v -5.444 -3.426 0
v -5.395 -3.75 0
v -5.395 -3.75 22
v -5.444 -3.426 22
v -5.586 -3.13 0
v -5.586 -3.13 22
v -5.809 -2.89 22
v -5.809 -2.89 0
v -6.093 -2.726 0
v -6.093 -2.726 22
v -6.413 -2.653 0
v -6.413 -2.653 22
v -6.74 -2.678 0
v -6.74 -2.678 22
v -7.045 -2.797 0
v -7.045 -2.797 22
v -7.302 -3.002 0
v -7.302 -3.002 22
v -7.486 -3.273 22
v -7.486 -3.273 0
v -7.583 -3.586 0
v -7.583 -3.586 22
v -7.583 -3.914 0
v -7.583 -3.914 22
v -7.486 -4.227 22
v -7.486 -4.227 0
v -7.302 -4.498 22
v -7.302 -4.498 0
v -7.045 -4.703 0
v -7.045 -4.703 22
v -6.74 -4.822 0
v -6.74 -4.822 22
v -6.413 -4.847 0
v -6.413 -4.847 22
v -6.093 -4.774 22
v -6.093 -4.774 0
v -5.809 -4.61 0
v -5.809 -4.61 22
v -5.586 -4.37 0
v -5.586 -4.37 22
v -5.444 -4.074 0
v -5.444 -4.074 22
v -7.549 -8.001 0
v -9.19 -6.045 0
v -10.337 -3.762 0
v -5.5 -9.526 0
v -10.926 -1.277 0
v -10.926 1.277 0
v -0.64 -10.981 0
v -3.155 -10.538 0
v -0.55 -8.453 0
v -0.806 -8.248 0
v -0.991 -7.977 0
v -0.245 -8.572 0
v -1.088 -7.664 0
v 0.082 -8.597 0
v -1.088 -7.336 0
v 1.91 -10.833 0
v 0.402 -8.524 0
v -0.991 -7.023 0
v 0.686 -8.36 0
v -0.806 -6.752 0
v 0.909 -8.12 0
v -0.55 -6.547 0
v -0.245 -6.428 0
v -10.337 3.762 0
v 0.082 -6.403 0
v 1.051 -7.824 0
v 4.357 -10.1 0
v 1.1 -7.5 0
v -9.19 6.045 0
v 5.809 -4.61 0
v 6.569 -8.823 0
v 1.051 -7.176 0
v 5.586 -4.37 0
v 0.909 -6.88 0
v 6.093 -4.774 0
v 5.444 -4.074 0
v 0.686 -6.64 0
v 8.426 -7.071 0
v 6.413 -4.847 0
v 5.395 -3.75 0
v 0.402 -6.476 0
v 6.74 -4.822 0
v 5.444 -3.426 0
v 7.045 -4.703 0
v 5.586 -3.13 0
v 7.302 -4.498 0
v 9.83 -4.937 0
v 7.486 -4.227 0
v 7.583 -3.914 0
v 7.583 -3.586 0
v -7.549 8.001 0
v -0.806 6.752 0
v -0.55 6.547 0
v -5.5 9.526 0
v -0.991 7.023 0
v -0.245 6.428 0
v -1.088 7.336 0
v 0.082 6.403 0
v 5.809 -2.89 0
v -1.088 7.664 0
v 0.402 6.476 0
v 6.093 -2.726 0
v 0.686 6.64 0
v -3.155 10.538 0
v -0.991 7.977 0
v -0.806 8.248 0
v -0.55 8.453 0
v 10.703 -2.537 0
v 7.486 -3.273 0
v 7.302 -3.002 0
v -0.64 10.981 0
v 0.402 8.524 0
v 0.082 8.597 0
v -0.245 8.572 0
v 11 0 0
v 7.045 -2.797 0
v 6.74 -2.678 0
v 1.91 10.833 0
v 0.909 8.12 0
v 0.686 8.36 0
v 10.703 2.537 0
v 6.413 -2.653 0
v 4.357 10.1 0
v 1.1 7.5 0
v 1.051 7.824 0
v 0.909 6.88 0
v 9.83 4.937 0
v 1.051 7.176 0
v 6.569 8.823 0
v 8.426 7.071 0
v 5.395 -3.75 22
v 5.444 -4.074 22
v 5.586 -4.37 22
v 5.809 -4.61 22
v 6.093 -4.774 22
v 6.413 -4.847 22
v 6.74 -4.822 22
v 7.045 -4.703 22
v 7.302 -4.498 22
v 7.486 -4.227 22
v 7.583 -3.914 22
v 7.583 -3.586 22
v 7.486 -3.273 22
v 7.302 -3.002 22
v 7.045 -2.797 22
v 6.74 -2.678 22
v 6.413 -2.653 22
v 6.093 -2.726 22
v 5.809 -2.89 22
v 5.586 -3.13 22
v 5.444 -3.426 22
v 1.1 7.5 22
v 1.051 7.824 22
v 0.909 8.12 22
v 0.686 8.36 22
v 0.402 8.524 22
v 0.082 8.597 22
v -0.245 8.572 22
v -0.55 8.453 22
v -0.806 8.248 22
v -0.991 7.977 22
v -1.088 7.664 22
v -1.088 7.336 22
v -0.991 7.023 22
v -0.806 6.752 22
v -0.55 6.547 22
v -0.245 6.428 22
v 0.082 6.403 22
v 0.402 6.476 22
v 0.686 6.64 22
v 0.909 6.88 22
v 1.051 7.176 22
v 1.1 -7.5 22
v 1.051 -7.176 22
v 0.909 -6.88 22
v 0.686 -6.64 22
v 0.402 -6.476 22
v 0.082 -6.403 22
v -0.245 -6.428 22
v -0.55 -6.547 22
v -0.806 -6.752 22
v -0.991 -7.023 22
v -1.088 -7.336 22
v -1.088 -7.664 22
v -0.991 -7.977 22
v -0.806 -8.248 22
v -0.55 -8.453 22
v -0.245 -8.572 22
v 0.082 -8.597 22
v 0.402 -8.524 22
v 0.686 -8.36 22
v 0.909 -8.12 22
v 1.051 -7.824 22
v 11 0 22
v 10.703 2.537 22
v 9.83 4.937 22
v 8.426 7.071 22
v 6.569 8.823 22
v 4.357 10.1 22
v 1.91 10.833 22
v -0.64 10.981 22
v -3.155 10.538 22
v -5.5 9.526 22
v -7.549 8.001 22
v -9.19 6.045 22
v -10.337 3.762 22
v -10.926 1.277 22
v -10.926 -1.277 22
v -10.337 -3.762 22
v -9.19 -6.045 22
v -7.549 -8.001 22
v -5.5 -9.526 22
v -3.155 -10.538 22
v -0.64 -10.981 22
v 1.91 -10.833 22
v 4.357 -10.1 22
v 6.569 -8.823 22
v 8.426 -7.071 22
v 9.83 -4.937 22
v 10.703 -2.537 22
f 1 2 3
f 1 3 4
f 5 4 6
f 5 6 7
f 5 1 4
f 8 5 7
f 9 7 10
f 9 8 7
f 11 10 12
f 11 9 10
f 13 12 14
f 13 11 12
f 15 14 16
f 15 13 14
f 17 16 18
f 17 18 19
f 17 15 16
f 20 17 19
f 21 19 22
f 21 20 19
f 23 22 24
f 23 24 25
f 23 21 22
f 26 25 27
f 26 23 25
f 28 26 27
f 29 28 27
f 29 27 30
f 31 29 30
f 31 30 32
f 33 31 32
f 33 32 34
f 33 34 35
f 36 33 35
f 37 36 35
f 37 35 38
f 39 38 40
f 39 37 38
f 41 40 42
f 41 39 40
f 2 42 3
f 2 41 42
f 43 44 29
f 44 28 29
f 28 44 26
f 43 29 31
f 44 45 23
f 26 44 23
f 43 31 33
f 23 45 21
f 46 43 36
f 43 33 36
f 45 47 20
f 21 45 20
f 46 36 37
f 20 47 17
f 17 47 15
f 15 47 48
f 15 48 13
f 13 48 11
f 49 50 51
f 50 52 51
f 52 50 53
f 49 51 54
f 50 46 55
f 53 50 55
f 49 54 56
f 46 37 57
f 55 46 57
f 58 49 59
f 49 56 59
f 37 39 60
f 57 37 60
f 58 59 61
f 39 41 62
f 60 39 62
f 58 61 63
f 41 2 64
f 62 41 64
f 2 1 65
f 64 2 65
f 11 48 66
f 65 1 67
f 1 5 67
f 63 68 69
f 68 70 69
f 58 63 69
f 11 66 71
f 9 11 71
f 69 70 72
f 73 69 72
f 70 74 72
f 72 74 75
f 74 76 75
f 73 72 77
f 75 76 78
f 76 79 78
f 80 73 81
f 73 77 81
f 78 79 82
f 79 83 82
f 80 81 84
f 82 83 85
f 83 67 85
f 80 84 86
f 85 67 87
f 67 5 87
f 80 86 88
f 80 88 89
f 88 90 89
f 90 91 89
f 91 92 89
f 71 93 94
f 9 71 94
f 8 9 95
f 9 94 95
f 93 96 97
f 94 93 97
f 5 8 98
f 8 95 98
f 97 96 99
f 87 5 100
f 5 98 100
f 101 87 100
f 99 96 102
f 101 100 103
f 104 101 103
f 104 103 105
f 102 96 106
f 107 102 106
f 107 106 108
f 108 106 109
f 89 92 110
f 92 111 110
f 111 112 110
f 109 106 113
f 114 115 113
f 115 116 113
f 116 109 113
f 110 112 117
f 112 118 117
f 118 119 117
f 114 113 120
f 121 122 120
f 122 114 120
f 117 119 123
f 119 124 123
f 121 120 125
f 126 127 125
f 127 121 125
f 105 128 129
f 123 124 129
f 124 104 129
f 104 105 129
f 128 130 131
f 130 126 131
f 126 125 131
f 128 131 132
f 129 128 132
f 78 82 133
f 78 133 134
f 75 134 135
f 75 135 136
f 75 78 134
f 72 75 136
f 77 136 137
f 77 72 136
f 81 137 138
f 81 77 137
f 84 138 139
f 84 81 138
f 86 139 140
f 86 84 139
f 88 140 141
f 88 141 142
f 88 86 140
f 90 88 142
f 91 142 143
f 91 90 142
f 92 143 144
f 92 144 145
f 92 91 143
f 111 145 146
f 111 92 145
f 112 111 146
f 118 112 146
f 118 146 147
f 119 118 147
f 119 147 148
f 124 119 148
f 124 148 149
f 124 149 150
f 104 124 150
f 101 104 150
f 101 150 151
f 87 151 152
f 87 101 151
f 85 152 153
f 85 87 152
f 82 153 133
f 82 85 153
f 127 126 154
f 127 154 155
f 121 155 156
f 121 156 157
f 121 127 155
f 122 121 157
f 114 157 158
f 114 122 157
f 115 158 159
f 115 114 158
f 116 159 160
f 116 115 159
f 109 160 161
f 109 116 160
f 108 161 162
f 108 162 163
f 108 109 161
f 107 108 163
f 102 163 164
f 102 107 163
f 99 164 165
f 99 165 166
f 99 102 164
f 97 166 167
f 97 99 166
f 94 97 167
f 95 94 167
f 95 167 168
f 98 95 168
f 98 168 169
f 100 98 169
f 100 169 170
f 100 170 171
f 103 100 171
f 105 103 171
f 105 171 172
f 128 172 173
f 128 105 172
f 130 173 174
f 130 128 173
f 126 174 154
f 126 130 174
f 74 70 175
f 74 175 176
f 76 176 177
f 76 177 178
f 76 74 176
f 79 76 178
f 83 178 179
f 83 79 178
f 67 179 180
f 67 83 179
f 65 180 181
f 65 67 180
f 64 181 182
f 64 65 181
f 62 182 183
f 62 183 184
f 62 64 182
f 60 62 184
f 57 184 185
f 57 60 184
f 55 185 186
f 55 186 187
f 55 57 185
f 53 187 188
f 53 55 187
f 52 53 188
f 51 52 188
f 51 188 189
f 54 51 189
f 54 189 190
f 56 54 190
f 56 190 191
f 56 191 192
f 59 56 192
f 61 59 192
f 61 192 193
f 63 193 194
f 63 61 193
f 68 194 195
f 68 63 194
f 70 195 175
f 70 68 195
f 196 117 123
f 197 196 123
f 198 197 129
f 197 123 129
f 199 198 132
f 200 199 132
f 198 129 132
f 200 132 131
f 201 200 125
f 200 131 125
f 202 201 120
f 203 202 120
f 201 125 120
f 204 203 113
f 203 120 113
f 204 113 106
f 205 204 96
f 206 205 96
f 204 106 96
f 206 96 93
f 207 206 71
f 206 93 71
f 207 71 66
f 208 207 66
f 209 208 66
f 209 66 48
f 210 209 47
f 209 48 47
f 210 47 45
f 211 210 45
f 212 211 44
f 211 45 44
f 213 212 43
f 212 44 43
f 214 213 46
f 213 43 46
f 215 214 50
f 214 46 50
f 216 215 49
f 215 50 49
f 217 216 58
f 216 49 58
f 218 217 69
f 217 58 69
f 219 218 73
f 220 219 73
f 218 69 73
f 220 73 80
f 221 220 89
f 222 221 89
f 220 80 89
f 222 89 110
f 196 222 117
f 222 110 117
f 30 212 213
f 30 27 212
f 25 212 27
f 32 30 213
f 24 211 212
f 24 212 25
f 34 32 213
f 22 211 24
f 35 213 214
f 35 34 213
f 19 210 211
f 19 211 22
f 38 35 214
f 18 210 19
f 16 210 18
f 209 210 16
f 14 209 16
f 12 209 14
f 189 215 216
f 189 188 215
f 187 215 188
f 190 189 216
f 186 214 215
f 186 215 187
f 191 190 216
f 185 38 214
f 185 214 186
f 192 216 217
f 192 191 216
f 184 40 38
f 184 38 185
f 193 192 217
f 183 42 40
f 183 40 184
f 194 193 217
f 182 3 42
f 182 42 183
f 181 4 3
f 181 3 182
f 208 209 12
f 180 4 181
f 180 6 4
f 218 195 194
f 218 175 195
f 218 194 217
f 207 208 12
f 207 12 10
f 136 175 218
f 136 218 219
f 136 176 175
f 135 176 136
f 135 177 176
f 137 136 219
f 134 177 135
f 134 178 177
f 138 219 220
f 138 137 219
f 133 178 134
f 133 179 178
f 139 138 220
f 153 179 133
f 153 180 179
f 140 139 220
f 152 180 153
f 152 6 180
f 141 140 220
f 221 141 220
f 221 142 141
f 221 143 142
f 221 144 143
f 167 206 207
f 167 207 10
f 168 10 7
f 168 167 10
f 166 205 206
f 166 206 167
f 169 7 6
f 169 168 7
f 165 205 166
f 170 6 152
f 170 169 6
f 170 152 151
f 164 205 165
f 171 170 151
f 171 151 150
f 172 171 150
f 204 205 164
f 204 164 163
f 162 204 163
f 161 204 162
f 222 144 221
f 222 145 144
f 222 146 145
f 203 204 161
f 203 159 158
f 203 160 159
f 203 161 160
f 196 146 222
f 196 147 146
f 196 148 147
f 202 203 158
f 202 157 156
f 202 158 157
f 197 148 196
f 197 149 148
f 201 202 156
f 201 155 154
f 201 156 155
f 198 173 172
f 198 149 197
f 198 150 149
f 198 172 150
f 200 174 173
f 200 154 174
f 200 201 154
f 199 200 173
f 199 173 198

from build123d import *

# Parameters (mm, degrees)
SKETCH_1_R      = 11
SKETCH_1_R_2    = 1.1
EXTRUDE_1_DEPTH = 22


with BuildPart() as part:
    # 草图1 → 凸台-拉伸1 (new body)
    with BuildSketch(Plane.XY):
        Circle(SKETCH_1_R)
        with Locations((0, 7.5)):
            Circle(SKETCH_1_R_2, mode=Mode.SUBTRACT)
        with Locations((0, -7.5)):
            Circle(SKETCH_1_R_2, mode=Mode.SUBTRACT)
        with Locations((-6.495190528, -3.75)):
            Circle(SKETCH_1_R_2, mode=Mode.SUBTRACT)
        with Locations(Location((6.495190528, -3.75, 0), (0, 0, 180))):
            Circle(SKETCH_1_R_2, mode=Mode.SUBTRACT)
    extrude(amount=EXTRUDE_1_DEPTH)


solid = part.part
